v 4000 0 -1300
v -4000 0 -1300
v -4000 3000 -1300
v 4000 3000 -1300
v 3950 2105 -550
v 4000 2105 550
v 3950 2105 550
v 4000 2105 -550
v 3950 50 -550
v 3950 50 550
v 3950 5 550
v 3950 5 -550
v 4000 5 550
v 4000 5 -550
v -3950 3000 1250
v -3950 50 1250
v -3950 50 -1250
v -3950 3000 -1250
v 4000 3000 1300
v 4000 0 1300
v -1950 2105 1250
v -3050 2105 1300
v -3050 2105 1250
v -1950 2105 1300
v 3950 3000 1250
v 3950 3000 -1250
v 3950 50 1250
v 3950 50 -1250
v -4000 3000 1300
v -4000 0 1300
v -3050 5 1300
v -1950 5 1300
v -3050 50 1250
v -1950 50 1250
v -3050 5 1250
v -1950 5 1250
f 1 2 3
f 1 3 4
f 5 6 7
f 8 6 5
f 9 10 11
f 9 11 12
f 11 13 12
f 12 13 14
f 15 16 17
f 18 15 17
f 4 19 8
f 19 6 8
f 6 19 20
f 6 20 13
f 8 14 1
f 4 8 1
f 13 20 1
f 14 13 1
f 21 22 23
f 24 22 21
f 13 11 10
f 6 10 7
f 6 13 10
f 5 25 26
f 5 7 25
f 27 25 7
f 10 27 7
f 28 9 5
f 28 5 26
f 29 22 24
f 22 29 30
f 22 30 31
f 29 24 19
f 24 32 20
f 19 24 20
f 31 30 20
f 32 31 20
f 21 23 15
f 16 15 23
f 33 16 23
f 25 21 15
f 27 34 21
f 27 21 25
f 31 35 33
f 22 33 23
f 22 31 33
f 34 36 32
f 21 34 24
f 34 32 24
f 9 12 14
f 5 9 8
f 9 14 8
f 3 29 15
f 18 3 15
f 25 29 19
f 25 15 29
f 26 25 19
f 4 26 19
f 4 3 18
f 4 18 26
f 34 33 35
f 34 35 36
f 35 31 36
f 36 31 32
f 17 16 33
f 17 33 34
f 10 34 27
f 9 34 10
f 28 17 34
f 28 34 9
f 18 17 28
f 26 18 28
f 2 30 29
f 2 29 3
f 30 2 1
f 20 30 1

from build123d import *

# Parameters (mm, degrees)
SKETCH2_W           = 8000
SKETCH2_H           = 2600
BOSS_EXTRUDE1_DEPTH = 3000
SHELL1_T            = -50
SKETCH3_W           = 1100
SKETCH3_H           = 2100
CUT_EXTRUDE1_DEPTH  = 50
SKETCH4_W           = 1100
SKETCH4_H           = 2100
CUT_EXTRUDE2_DEPTH  = 50


with BuildPart() as part:
    # Sketch2 → Boss-Extrude1 (new body)
    with BuildSketch(Plane(origin=(0, 0, 0), x_dir=(1, 0, 0), z_dir=(0, 1, 0))):
        Rectangle(SKETCH2_W, SKETCH2_H)
    extrude(amount=BOSS_EXTRUDE1_DEPTH)

    # Shell1
    shell1_openings = [part.faces().sort_by_distance(p)[0] for p in [
        (0, 3000, 0),
    ]]
    offset(amount=SHELL1_T, openings=shell1_openings, kind=Kind.INTERSECTION)

    # Sketch3 → Cut-Extrude1 (cut)
    with BuildSketch(Plane.XY.offset(1300)):
        with Locations((-2500, 1055)):
            Rectangle(SKETCH3_W, SKETCH3_H)
    extrude(amount=-CUT_EXTRUDE1_DEPTH, mode=Mode.SUBTRACT)

    # Sketch4 → Cut-Extrude2 (cut)
    with BuildSketch(Plane(origin=(4000, 0, 0), x_dir=(0, 0, -1), z_dir=(1, 0, 0))):
        with Locations((0, 1055)):
            Rectangle(SKETCH4_W, SKETCH4_H)
    extrude(amount=-CUT_EXTRUDE2_DEPTH, mode=Mode.SUBTRACT)


solid = part.part
